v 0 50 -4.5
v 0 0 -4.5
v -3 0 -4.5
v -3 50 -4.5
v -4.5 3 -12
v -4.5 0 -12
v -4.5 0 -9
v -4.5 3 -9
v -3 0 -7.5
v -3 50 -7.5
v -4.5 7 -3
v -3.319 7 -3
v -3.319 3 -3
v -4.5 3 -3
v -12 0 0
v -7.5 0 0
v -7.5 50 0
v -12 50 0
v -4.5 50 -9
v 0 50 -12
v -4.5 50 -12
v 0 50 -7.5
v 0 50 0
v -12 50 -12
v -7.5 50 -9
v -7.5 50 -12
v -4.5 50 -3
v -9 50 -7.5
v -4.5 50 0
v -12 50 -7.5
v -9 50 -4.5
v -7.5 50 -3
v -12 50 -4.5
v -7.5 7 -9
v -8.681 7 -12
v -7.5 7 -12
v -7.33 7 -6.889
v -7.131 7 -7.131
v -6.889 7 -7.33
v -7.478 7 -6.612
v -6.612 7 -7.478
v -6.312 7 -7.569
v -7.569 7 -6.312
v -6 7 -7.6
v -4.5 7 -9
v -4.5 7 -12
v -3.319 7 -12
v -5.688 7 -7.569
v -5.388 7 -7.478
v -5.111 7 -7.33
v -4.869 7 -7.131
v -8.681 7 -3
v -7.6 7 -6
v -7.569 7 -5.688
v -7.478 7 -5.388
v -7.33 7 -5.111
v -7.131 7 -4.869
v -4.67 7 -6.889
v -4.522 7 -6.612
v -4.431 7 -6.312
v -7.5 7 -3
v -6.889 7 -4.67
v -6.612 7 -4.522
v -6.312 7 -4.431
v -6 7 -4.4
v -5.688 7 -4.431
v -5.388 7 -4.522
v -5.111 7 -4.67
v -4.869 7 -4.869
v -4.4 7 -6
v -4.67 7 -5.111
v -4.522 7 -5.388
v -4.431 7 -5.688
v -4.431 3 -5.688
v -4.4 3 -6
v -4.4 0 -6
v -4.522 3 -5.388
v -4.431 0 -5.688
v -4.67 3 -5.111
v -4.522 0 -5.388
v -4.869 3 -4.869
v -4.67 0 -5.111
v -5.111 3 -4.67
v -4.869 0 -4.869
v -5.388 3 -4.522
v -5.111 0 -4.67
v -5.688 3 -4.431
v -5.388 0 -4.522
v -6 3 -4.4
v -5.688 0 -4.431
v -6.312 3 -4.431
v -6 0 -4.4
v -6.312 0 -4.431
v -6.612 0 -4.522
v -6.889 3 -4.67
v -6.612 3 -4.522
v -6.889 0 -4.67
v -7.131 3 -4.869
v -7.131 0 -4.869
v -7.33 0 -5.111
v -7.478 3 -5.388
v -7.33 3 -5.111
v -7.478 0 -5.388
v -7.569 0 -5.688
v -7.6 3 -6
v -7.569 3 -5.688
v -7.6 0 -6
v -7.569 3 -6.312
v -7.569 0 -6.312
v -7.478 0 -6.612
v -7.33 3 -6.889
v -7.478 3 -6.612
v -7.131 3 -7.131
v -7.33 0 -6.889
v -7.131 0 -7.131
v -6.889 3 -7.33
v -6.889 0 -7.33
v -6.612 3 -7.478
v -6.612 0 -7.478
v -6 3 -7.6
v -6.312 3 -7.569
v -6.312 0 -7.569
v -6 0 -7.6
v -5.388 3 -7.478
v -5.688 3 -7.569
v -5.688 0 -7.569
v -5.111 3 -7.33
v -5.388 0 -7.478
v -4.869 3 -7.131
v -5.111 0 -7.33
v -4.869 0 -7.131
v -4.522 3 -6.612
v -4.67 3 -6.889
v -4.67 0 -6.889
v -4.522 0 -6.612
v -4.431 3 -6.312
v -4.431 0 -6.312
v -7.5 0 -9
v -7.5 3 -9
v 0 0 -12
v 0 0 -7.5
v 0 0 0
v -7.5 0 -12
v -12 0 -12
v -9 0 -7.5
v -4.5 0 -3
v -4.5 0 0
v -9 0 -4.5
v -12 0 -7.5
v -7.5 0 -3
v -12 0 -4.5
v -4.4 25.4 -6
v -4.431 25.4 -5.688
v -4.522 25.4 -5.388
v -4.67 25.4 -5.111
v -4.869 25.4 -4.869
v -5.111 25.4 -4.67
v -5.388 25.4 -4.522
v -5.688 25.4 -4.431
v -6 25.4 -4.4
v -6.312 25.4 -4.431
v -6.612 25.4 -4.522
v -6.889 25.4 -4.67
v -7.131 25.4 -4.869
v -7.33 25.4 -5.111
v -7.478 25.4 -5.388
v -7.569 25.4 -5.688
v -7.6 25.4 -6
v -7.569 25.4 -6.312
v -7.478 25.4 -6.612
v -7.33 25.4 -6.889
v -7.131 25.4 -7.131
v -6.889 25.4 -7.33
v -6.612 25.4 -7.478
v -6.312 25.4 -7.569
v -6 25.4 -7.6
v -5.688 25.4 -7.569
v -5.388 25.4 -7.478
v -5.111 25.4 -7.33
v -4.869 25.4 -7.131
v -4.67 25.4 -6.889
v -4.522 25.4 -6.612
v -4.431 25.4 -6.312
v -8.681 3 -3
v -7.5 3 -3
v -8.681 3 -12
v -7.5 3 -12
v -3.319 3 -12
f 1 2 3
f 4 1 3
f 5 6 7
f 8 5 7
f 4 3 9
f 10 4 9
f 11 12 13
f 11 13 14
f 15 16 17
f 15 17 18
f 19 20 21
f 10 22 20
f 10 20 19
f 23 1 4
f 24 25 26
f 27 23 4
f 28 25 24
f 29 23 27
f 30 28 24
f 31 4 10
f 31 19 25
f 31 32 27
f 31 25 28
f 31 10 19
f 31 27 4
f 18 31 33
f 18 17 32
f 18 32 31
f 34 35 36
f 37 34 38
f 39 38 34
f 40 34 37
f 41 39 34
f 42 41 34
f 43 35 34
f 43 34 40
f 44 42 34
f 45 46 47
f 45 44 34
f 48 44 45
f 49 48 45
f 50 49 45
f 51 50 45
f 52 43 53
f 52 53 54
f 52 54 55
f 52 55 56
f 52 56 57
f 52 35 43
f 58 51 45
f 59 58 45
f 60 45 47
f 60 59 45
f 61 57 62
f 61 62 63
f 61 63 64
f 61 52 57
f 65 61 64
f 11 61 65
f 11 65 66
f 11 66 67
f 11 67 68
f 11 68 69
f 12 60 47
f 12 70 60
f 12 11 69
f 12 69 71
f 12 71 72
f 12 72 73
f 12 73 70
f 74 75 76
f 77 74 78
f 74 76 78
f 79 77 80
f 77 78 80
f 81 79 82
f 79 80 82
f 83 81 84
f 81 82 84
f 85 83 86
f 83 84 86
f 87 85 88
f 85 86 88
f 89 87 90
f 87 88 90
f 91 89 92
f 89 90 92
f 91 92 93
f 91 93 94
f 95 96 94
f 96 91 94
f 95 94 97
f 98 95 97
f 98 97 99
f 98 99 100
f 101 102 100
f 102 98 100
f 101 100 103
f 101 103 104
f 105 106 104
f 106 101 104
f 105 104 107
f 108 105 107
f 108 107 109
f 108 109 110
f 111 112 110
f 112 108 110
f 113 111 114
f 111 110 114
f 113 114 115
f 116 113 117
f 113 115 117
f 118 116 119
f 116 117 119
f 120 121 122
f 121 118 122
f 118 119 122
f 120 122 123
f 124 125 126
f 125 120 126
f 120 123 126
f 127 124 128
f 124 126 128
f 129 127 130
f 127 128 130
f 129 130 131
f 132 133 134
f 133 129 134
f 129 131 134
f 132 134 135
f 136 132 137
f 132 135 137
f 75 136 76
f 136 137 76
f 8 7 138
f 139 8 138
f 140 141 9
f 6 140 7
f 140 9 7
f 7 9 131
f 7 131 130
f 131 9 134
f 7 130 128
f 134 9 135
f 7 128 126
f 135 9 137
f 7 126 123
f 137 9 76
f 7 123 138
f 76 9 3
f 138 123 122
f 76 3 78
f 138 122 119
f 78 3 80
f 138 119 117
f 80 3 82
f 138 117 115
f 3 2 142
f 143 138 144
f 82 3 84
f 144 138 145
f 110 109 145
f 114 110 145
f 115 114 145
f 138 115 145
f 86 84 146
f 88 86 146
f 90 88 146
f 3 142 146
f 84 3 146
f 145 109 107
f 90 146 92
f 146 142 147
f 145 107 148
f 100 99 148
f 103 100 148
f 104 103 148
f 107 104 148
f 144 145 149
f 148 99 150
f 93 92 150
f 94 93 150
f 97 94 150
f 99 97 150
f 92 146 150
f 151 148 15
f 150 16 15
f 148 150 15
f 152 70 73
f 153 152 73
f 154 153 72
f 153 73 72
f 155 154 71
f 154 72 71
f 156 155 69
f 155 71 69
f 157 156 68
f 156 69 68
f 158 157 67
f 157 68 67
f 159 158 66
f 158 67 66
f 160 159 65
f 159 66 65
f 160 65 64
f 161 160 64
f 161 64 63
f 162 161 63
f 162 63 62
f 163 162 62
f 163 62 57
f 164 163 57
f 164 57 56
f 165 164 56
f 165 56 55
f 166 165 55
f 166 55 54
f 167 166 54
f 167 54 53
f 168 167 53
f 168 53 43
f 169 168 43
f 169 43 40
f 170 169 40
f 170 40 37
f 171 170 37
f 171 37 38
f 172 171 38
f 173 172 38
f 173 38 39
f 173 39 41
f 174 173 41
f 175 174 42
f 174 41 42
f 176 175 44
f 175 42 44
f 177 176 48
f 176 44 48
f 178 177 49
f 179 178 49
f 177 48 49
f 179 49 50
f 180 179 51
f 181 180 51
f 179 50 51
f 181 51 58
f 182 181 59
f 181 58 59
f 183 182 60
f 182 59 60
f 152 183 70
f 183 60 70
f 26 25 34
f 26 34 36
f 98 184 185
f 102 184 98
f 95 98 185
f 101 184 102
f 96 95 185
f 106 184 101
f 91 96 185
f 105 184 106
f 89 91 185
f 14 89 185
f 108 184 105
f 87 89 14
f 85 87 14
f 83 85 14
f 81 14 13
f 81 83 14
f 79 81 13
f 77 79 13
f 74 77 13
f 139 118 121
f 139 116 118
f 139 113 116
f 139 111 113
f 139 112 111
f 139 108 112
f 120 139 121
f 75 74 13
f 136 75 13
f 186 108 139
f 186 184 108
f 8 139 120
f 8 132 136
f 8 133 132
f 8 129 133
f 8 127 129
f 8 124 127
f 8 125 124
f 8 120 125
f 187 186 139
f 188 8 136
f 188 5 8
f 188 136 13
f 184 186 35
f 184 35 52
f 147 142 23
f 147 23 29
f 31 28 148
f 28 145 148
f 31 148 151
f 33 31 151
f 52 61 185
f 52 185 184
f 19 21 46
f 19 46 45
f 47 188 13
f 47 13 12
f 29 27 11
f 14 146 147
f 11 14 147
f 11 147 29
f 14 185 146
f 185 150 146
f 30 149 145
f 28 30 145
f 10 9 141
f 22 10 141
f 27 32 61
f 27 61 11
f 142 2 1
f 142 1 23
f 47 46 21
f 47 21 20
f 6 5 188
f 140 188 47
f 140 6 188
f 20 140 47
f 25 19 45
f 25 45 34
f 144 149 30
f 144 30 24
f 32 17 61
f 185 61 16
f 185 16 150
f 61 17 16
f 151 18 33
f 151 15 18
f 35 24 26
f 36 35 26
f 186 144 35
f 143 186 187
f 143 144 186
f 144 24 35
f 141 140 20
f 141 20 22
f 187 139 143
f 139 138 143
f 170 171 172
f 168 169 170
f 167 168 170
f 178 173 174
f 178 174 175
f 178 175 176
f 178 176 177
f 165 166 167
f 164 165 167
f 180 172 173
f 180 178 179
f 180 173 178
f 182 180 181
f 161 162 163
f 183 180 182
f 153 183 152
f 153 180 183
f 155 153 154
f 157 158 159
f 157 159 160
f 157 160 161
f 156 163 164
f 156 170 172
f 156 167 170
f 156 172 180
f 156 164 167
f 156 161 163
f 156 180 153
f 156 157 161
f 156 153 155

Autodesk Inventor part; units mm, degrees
ref_plane "YZ Plane" through (0, 0, 0) normal (1, 0, 0) x (0, 1, 0)
ref_plane "XZ Plane" through (0, 0, 0) normal (0, 1, 0) x (-1, 0, 0)
sketch "Sketch1" plane through (0, 0, 0) normal (0, 1, 0) x (-1, 0, 0)
  line L0 (0, -8.85) -> (0, -7.5)
  line L1 (0, -4.5) -> (0, -3.15)
  line L2 (3, -6) -> (3, -7.5)
  line L3 (3, -7.5) -> (0, -7.5)
  line L4 (0, -4.5) -> (3, -4.5)
  line L5 (3, -4.5) -> (3, -6)
  line L6 (4.5, -12) -> (4.5, -9)
  line L7 (4.5, -9) -> (6, -9)
  line L8 (6, -9) -> (7.5, -9)
  line L9 (7.5, -9) -> (7.5, -12)
  line L10 (12, -7.5) -> (9, -7.5)
  line L11 (9, -7.5) -> (9, -6)
  line L12 (9, -6) -> (9, -4.5)
  line L13 (9, -4.5) -> (12, -4.5)
  line L14 (7.5, 0) -> (7.5, -3)
  line L15 (7.5, -3) -> (6, -3)
  line L16 (6, -3) -> (4.5, -3)
  line L17 (4.5, -3) -> (4.5, 0)
  line L18 (12, 0) -> (12, -4.5)
  line L19 (12, -7.5) -> (12, -12)
  line L20 (12, -12) -> (7.5, -12)
  line L21 (4.5, -12) -> (0, -12)
  line L22 (0, 0) -> (4.5, 0)
  line L23 (7.5, 0) -> (12, 0)
  line L24 (0, -12) -> (0, -7.5)
  line L25 (0, -4.5) -> (0, 0)
  point P0 (6, -6)
  dimension "d10" = 360
  dimension "d1" = 12
extrude "Extrusion1" add sketch "Sketch1" along normal blind 50
ref_plane "Work Plane1" through (0, 3, 0) normal (0, -1, 0) x (1, 0, 0)
sketch "Sketch6" plane through (0, 3, 0) normal (0, -1, 0) x (1, 0, 0)
  line L0 (-8.6812, -4.452) -> (-7.3406, -3.678) projected
  line L1 (-7.3406, -3.678) -> (-6.1663, -3) projected
  line L2 (-6.1663, -3) -> (-5.8337, -3) projected
  line L3 (-5.8337, -3) -> (-4.6594, -3.678) projected
  line L4 (-4.6594, -3.678) -> (-3.3187, -4.452) projected
  line L5 (-3.3187, -4.452) -> (-3.3188, -6) projected
  line L6 (-3.3188, -6) -> (-3.3188, -12) projected
  line L7 (-3.3188, -12) -> (-4.5, -12) projected
  line L8 (-4.5, -12) -> (-4.5, -9) projected
  line L9 (-4.5, -9) -> (-7.5, -9) projected
  line L10 (-7.5, -9) -> (-7.5, -12) projected
  line L11 (-7.5, -12) -> (-8.6812, -12) projected
  line L12 (-8.6812, -12) -> (-8.6812, -6) projected
  line L13 (-8.6812, -6) -> (-8.6812, -4.452) projected
  point P0 (0, 0)
extrude "Extrusion2" cut sketch "Sketch6" against normal blind 4
sketch "Sketch7" plane through (0, 0, 0) normal (0, -1, 0) x (1, 0, 0)
  line L0 (0, 0) -> (0, -4.5) projected
  line L1 (-4.5, 0) -> (0, 0) projected
  line L2 (-4.5, -3) -> (-4.5, 0) projected
  line L3 (-7.5, -3) -> (-4.5, -3) projected
  line L4 (-7.5, 0) -> (-7.5, -3) projected
  line L5 (-12, 0) -> (-7.5, 0) projected
  line L6 (-12, -4.5) -> (-12, 0) projected
  line L7 (-9, -4.5) -> (-12, -4.5) projected
  line L8 (-9, -7.5) -> (-9, -4.5) projected
  line L9 (-12, -7.5) -> (-9, -7.5) projected
  line L10 (-12, -12) -> (-12, -7.5) projected
  line L11 (-7.5, -12) -> (-12, -12) projected
  line L12 (-7.5, -9) -> (-7.5, -12) projected
  line L13 (-4.5, -9) -> (-7.5, -9) projected
  line L14 (-4.5, -12) -> (-4.5, -9) projected
  line L15 (0, -12) -> (-4.5, -12) projected
  line L16 (0, -7.5) -> (0, -12) projected
  line L17 (-3, -7.5) -> (0, -7.5) projected
  line L18 (-3, -4.5) -> (-3, -7.5) projected
  line L19 (0, -4.5) -> (-3, -4.5) projected
  circle A0 centre (-6, -6) radius 1.6
  dimension "d26" = 3.2
extrude "Extrusion3" cut sketch "Sketch7" against normal blind 25.4 contours A0
sketch "Sketch8" plane through (-7.5, 0, -12) normal (0, 0, -1) x (-1, 0, 0)
  line L0 (-3, 7) -> (0, 7)
  line L1 (-3, 50) -> (0, 50)
  line L2 (-1.6663, 3) -> (-4.1813, 3)
  line L3 (-1.6663, 7) -> (-4.1813, 7)
  line L4 (-4.1813, 3) -> (-4.1813, 7)
  line L5 (0, 3) -> (-3, 3)
  line L6 (-3, 0) -> (0, 0)
  line L7 (1.1812, 3) -> (-0.1594, 3)
  line L8 (1.1812, 3) -> (1.1812, 7)
  line L9 (1.1812, 7) -> (-0.1594, 7)
  point P0 (-7.5, 0)
extrude "Extrusion4" cut sketch "Sketch8" against normal up to surface (9 mm away)
properties part number "Maze Wall Post"
